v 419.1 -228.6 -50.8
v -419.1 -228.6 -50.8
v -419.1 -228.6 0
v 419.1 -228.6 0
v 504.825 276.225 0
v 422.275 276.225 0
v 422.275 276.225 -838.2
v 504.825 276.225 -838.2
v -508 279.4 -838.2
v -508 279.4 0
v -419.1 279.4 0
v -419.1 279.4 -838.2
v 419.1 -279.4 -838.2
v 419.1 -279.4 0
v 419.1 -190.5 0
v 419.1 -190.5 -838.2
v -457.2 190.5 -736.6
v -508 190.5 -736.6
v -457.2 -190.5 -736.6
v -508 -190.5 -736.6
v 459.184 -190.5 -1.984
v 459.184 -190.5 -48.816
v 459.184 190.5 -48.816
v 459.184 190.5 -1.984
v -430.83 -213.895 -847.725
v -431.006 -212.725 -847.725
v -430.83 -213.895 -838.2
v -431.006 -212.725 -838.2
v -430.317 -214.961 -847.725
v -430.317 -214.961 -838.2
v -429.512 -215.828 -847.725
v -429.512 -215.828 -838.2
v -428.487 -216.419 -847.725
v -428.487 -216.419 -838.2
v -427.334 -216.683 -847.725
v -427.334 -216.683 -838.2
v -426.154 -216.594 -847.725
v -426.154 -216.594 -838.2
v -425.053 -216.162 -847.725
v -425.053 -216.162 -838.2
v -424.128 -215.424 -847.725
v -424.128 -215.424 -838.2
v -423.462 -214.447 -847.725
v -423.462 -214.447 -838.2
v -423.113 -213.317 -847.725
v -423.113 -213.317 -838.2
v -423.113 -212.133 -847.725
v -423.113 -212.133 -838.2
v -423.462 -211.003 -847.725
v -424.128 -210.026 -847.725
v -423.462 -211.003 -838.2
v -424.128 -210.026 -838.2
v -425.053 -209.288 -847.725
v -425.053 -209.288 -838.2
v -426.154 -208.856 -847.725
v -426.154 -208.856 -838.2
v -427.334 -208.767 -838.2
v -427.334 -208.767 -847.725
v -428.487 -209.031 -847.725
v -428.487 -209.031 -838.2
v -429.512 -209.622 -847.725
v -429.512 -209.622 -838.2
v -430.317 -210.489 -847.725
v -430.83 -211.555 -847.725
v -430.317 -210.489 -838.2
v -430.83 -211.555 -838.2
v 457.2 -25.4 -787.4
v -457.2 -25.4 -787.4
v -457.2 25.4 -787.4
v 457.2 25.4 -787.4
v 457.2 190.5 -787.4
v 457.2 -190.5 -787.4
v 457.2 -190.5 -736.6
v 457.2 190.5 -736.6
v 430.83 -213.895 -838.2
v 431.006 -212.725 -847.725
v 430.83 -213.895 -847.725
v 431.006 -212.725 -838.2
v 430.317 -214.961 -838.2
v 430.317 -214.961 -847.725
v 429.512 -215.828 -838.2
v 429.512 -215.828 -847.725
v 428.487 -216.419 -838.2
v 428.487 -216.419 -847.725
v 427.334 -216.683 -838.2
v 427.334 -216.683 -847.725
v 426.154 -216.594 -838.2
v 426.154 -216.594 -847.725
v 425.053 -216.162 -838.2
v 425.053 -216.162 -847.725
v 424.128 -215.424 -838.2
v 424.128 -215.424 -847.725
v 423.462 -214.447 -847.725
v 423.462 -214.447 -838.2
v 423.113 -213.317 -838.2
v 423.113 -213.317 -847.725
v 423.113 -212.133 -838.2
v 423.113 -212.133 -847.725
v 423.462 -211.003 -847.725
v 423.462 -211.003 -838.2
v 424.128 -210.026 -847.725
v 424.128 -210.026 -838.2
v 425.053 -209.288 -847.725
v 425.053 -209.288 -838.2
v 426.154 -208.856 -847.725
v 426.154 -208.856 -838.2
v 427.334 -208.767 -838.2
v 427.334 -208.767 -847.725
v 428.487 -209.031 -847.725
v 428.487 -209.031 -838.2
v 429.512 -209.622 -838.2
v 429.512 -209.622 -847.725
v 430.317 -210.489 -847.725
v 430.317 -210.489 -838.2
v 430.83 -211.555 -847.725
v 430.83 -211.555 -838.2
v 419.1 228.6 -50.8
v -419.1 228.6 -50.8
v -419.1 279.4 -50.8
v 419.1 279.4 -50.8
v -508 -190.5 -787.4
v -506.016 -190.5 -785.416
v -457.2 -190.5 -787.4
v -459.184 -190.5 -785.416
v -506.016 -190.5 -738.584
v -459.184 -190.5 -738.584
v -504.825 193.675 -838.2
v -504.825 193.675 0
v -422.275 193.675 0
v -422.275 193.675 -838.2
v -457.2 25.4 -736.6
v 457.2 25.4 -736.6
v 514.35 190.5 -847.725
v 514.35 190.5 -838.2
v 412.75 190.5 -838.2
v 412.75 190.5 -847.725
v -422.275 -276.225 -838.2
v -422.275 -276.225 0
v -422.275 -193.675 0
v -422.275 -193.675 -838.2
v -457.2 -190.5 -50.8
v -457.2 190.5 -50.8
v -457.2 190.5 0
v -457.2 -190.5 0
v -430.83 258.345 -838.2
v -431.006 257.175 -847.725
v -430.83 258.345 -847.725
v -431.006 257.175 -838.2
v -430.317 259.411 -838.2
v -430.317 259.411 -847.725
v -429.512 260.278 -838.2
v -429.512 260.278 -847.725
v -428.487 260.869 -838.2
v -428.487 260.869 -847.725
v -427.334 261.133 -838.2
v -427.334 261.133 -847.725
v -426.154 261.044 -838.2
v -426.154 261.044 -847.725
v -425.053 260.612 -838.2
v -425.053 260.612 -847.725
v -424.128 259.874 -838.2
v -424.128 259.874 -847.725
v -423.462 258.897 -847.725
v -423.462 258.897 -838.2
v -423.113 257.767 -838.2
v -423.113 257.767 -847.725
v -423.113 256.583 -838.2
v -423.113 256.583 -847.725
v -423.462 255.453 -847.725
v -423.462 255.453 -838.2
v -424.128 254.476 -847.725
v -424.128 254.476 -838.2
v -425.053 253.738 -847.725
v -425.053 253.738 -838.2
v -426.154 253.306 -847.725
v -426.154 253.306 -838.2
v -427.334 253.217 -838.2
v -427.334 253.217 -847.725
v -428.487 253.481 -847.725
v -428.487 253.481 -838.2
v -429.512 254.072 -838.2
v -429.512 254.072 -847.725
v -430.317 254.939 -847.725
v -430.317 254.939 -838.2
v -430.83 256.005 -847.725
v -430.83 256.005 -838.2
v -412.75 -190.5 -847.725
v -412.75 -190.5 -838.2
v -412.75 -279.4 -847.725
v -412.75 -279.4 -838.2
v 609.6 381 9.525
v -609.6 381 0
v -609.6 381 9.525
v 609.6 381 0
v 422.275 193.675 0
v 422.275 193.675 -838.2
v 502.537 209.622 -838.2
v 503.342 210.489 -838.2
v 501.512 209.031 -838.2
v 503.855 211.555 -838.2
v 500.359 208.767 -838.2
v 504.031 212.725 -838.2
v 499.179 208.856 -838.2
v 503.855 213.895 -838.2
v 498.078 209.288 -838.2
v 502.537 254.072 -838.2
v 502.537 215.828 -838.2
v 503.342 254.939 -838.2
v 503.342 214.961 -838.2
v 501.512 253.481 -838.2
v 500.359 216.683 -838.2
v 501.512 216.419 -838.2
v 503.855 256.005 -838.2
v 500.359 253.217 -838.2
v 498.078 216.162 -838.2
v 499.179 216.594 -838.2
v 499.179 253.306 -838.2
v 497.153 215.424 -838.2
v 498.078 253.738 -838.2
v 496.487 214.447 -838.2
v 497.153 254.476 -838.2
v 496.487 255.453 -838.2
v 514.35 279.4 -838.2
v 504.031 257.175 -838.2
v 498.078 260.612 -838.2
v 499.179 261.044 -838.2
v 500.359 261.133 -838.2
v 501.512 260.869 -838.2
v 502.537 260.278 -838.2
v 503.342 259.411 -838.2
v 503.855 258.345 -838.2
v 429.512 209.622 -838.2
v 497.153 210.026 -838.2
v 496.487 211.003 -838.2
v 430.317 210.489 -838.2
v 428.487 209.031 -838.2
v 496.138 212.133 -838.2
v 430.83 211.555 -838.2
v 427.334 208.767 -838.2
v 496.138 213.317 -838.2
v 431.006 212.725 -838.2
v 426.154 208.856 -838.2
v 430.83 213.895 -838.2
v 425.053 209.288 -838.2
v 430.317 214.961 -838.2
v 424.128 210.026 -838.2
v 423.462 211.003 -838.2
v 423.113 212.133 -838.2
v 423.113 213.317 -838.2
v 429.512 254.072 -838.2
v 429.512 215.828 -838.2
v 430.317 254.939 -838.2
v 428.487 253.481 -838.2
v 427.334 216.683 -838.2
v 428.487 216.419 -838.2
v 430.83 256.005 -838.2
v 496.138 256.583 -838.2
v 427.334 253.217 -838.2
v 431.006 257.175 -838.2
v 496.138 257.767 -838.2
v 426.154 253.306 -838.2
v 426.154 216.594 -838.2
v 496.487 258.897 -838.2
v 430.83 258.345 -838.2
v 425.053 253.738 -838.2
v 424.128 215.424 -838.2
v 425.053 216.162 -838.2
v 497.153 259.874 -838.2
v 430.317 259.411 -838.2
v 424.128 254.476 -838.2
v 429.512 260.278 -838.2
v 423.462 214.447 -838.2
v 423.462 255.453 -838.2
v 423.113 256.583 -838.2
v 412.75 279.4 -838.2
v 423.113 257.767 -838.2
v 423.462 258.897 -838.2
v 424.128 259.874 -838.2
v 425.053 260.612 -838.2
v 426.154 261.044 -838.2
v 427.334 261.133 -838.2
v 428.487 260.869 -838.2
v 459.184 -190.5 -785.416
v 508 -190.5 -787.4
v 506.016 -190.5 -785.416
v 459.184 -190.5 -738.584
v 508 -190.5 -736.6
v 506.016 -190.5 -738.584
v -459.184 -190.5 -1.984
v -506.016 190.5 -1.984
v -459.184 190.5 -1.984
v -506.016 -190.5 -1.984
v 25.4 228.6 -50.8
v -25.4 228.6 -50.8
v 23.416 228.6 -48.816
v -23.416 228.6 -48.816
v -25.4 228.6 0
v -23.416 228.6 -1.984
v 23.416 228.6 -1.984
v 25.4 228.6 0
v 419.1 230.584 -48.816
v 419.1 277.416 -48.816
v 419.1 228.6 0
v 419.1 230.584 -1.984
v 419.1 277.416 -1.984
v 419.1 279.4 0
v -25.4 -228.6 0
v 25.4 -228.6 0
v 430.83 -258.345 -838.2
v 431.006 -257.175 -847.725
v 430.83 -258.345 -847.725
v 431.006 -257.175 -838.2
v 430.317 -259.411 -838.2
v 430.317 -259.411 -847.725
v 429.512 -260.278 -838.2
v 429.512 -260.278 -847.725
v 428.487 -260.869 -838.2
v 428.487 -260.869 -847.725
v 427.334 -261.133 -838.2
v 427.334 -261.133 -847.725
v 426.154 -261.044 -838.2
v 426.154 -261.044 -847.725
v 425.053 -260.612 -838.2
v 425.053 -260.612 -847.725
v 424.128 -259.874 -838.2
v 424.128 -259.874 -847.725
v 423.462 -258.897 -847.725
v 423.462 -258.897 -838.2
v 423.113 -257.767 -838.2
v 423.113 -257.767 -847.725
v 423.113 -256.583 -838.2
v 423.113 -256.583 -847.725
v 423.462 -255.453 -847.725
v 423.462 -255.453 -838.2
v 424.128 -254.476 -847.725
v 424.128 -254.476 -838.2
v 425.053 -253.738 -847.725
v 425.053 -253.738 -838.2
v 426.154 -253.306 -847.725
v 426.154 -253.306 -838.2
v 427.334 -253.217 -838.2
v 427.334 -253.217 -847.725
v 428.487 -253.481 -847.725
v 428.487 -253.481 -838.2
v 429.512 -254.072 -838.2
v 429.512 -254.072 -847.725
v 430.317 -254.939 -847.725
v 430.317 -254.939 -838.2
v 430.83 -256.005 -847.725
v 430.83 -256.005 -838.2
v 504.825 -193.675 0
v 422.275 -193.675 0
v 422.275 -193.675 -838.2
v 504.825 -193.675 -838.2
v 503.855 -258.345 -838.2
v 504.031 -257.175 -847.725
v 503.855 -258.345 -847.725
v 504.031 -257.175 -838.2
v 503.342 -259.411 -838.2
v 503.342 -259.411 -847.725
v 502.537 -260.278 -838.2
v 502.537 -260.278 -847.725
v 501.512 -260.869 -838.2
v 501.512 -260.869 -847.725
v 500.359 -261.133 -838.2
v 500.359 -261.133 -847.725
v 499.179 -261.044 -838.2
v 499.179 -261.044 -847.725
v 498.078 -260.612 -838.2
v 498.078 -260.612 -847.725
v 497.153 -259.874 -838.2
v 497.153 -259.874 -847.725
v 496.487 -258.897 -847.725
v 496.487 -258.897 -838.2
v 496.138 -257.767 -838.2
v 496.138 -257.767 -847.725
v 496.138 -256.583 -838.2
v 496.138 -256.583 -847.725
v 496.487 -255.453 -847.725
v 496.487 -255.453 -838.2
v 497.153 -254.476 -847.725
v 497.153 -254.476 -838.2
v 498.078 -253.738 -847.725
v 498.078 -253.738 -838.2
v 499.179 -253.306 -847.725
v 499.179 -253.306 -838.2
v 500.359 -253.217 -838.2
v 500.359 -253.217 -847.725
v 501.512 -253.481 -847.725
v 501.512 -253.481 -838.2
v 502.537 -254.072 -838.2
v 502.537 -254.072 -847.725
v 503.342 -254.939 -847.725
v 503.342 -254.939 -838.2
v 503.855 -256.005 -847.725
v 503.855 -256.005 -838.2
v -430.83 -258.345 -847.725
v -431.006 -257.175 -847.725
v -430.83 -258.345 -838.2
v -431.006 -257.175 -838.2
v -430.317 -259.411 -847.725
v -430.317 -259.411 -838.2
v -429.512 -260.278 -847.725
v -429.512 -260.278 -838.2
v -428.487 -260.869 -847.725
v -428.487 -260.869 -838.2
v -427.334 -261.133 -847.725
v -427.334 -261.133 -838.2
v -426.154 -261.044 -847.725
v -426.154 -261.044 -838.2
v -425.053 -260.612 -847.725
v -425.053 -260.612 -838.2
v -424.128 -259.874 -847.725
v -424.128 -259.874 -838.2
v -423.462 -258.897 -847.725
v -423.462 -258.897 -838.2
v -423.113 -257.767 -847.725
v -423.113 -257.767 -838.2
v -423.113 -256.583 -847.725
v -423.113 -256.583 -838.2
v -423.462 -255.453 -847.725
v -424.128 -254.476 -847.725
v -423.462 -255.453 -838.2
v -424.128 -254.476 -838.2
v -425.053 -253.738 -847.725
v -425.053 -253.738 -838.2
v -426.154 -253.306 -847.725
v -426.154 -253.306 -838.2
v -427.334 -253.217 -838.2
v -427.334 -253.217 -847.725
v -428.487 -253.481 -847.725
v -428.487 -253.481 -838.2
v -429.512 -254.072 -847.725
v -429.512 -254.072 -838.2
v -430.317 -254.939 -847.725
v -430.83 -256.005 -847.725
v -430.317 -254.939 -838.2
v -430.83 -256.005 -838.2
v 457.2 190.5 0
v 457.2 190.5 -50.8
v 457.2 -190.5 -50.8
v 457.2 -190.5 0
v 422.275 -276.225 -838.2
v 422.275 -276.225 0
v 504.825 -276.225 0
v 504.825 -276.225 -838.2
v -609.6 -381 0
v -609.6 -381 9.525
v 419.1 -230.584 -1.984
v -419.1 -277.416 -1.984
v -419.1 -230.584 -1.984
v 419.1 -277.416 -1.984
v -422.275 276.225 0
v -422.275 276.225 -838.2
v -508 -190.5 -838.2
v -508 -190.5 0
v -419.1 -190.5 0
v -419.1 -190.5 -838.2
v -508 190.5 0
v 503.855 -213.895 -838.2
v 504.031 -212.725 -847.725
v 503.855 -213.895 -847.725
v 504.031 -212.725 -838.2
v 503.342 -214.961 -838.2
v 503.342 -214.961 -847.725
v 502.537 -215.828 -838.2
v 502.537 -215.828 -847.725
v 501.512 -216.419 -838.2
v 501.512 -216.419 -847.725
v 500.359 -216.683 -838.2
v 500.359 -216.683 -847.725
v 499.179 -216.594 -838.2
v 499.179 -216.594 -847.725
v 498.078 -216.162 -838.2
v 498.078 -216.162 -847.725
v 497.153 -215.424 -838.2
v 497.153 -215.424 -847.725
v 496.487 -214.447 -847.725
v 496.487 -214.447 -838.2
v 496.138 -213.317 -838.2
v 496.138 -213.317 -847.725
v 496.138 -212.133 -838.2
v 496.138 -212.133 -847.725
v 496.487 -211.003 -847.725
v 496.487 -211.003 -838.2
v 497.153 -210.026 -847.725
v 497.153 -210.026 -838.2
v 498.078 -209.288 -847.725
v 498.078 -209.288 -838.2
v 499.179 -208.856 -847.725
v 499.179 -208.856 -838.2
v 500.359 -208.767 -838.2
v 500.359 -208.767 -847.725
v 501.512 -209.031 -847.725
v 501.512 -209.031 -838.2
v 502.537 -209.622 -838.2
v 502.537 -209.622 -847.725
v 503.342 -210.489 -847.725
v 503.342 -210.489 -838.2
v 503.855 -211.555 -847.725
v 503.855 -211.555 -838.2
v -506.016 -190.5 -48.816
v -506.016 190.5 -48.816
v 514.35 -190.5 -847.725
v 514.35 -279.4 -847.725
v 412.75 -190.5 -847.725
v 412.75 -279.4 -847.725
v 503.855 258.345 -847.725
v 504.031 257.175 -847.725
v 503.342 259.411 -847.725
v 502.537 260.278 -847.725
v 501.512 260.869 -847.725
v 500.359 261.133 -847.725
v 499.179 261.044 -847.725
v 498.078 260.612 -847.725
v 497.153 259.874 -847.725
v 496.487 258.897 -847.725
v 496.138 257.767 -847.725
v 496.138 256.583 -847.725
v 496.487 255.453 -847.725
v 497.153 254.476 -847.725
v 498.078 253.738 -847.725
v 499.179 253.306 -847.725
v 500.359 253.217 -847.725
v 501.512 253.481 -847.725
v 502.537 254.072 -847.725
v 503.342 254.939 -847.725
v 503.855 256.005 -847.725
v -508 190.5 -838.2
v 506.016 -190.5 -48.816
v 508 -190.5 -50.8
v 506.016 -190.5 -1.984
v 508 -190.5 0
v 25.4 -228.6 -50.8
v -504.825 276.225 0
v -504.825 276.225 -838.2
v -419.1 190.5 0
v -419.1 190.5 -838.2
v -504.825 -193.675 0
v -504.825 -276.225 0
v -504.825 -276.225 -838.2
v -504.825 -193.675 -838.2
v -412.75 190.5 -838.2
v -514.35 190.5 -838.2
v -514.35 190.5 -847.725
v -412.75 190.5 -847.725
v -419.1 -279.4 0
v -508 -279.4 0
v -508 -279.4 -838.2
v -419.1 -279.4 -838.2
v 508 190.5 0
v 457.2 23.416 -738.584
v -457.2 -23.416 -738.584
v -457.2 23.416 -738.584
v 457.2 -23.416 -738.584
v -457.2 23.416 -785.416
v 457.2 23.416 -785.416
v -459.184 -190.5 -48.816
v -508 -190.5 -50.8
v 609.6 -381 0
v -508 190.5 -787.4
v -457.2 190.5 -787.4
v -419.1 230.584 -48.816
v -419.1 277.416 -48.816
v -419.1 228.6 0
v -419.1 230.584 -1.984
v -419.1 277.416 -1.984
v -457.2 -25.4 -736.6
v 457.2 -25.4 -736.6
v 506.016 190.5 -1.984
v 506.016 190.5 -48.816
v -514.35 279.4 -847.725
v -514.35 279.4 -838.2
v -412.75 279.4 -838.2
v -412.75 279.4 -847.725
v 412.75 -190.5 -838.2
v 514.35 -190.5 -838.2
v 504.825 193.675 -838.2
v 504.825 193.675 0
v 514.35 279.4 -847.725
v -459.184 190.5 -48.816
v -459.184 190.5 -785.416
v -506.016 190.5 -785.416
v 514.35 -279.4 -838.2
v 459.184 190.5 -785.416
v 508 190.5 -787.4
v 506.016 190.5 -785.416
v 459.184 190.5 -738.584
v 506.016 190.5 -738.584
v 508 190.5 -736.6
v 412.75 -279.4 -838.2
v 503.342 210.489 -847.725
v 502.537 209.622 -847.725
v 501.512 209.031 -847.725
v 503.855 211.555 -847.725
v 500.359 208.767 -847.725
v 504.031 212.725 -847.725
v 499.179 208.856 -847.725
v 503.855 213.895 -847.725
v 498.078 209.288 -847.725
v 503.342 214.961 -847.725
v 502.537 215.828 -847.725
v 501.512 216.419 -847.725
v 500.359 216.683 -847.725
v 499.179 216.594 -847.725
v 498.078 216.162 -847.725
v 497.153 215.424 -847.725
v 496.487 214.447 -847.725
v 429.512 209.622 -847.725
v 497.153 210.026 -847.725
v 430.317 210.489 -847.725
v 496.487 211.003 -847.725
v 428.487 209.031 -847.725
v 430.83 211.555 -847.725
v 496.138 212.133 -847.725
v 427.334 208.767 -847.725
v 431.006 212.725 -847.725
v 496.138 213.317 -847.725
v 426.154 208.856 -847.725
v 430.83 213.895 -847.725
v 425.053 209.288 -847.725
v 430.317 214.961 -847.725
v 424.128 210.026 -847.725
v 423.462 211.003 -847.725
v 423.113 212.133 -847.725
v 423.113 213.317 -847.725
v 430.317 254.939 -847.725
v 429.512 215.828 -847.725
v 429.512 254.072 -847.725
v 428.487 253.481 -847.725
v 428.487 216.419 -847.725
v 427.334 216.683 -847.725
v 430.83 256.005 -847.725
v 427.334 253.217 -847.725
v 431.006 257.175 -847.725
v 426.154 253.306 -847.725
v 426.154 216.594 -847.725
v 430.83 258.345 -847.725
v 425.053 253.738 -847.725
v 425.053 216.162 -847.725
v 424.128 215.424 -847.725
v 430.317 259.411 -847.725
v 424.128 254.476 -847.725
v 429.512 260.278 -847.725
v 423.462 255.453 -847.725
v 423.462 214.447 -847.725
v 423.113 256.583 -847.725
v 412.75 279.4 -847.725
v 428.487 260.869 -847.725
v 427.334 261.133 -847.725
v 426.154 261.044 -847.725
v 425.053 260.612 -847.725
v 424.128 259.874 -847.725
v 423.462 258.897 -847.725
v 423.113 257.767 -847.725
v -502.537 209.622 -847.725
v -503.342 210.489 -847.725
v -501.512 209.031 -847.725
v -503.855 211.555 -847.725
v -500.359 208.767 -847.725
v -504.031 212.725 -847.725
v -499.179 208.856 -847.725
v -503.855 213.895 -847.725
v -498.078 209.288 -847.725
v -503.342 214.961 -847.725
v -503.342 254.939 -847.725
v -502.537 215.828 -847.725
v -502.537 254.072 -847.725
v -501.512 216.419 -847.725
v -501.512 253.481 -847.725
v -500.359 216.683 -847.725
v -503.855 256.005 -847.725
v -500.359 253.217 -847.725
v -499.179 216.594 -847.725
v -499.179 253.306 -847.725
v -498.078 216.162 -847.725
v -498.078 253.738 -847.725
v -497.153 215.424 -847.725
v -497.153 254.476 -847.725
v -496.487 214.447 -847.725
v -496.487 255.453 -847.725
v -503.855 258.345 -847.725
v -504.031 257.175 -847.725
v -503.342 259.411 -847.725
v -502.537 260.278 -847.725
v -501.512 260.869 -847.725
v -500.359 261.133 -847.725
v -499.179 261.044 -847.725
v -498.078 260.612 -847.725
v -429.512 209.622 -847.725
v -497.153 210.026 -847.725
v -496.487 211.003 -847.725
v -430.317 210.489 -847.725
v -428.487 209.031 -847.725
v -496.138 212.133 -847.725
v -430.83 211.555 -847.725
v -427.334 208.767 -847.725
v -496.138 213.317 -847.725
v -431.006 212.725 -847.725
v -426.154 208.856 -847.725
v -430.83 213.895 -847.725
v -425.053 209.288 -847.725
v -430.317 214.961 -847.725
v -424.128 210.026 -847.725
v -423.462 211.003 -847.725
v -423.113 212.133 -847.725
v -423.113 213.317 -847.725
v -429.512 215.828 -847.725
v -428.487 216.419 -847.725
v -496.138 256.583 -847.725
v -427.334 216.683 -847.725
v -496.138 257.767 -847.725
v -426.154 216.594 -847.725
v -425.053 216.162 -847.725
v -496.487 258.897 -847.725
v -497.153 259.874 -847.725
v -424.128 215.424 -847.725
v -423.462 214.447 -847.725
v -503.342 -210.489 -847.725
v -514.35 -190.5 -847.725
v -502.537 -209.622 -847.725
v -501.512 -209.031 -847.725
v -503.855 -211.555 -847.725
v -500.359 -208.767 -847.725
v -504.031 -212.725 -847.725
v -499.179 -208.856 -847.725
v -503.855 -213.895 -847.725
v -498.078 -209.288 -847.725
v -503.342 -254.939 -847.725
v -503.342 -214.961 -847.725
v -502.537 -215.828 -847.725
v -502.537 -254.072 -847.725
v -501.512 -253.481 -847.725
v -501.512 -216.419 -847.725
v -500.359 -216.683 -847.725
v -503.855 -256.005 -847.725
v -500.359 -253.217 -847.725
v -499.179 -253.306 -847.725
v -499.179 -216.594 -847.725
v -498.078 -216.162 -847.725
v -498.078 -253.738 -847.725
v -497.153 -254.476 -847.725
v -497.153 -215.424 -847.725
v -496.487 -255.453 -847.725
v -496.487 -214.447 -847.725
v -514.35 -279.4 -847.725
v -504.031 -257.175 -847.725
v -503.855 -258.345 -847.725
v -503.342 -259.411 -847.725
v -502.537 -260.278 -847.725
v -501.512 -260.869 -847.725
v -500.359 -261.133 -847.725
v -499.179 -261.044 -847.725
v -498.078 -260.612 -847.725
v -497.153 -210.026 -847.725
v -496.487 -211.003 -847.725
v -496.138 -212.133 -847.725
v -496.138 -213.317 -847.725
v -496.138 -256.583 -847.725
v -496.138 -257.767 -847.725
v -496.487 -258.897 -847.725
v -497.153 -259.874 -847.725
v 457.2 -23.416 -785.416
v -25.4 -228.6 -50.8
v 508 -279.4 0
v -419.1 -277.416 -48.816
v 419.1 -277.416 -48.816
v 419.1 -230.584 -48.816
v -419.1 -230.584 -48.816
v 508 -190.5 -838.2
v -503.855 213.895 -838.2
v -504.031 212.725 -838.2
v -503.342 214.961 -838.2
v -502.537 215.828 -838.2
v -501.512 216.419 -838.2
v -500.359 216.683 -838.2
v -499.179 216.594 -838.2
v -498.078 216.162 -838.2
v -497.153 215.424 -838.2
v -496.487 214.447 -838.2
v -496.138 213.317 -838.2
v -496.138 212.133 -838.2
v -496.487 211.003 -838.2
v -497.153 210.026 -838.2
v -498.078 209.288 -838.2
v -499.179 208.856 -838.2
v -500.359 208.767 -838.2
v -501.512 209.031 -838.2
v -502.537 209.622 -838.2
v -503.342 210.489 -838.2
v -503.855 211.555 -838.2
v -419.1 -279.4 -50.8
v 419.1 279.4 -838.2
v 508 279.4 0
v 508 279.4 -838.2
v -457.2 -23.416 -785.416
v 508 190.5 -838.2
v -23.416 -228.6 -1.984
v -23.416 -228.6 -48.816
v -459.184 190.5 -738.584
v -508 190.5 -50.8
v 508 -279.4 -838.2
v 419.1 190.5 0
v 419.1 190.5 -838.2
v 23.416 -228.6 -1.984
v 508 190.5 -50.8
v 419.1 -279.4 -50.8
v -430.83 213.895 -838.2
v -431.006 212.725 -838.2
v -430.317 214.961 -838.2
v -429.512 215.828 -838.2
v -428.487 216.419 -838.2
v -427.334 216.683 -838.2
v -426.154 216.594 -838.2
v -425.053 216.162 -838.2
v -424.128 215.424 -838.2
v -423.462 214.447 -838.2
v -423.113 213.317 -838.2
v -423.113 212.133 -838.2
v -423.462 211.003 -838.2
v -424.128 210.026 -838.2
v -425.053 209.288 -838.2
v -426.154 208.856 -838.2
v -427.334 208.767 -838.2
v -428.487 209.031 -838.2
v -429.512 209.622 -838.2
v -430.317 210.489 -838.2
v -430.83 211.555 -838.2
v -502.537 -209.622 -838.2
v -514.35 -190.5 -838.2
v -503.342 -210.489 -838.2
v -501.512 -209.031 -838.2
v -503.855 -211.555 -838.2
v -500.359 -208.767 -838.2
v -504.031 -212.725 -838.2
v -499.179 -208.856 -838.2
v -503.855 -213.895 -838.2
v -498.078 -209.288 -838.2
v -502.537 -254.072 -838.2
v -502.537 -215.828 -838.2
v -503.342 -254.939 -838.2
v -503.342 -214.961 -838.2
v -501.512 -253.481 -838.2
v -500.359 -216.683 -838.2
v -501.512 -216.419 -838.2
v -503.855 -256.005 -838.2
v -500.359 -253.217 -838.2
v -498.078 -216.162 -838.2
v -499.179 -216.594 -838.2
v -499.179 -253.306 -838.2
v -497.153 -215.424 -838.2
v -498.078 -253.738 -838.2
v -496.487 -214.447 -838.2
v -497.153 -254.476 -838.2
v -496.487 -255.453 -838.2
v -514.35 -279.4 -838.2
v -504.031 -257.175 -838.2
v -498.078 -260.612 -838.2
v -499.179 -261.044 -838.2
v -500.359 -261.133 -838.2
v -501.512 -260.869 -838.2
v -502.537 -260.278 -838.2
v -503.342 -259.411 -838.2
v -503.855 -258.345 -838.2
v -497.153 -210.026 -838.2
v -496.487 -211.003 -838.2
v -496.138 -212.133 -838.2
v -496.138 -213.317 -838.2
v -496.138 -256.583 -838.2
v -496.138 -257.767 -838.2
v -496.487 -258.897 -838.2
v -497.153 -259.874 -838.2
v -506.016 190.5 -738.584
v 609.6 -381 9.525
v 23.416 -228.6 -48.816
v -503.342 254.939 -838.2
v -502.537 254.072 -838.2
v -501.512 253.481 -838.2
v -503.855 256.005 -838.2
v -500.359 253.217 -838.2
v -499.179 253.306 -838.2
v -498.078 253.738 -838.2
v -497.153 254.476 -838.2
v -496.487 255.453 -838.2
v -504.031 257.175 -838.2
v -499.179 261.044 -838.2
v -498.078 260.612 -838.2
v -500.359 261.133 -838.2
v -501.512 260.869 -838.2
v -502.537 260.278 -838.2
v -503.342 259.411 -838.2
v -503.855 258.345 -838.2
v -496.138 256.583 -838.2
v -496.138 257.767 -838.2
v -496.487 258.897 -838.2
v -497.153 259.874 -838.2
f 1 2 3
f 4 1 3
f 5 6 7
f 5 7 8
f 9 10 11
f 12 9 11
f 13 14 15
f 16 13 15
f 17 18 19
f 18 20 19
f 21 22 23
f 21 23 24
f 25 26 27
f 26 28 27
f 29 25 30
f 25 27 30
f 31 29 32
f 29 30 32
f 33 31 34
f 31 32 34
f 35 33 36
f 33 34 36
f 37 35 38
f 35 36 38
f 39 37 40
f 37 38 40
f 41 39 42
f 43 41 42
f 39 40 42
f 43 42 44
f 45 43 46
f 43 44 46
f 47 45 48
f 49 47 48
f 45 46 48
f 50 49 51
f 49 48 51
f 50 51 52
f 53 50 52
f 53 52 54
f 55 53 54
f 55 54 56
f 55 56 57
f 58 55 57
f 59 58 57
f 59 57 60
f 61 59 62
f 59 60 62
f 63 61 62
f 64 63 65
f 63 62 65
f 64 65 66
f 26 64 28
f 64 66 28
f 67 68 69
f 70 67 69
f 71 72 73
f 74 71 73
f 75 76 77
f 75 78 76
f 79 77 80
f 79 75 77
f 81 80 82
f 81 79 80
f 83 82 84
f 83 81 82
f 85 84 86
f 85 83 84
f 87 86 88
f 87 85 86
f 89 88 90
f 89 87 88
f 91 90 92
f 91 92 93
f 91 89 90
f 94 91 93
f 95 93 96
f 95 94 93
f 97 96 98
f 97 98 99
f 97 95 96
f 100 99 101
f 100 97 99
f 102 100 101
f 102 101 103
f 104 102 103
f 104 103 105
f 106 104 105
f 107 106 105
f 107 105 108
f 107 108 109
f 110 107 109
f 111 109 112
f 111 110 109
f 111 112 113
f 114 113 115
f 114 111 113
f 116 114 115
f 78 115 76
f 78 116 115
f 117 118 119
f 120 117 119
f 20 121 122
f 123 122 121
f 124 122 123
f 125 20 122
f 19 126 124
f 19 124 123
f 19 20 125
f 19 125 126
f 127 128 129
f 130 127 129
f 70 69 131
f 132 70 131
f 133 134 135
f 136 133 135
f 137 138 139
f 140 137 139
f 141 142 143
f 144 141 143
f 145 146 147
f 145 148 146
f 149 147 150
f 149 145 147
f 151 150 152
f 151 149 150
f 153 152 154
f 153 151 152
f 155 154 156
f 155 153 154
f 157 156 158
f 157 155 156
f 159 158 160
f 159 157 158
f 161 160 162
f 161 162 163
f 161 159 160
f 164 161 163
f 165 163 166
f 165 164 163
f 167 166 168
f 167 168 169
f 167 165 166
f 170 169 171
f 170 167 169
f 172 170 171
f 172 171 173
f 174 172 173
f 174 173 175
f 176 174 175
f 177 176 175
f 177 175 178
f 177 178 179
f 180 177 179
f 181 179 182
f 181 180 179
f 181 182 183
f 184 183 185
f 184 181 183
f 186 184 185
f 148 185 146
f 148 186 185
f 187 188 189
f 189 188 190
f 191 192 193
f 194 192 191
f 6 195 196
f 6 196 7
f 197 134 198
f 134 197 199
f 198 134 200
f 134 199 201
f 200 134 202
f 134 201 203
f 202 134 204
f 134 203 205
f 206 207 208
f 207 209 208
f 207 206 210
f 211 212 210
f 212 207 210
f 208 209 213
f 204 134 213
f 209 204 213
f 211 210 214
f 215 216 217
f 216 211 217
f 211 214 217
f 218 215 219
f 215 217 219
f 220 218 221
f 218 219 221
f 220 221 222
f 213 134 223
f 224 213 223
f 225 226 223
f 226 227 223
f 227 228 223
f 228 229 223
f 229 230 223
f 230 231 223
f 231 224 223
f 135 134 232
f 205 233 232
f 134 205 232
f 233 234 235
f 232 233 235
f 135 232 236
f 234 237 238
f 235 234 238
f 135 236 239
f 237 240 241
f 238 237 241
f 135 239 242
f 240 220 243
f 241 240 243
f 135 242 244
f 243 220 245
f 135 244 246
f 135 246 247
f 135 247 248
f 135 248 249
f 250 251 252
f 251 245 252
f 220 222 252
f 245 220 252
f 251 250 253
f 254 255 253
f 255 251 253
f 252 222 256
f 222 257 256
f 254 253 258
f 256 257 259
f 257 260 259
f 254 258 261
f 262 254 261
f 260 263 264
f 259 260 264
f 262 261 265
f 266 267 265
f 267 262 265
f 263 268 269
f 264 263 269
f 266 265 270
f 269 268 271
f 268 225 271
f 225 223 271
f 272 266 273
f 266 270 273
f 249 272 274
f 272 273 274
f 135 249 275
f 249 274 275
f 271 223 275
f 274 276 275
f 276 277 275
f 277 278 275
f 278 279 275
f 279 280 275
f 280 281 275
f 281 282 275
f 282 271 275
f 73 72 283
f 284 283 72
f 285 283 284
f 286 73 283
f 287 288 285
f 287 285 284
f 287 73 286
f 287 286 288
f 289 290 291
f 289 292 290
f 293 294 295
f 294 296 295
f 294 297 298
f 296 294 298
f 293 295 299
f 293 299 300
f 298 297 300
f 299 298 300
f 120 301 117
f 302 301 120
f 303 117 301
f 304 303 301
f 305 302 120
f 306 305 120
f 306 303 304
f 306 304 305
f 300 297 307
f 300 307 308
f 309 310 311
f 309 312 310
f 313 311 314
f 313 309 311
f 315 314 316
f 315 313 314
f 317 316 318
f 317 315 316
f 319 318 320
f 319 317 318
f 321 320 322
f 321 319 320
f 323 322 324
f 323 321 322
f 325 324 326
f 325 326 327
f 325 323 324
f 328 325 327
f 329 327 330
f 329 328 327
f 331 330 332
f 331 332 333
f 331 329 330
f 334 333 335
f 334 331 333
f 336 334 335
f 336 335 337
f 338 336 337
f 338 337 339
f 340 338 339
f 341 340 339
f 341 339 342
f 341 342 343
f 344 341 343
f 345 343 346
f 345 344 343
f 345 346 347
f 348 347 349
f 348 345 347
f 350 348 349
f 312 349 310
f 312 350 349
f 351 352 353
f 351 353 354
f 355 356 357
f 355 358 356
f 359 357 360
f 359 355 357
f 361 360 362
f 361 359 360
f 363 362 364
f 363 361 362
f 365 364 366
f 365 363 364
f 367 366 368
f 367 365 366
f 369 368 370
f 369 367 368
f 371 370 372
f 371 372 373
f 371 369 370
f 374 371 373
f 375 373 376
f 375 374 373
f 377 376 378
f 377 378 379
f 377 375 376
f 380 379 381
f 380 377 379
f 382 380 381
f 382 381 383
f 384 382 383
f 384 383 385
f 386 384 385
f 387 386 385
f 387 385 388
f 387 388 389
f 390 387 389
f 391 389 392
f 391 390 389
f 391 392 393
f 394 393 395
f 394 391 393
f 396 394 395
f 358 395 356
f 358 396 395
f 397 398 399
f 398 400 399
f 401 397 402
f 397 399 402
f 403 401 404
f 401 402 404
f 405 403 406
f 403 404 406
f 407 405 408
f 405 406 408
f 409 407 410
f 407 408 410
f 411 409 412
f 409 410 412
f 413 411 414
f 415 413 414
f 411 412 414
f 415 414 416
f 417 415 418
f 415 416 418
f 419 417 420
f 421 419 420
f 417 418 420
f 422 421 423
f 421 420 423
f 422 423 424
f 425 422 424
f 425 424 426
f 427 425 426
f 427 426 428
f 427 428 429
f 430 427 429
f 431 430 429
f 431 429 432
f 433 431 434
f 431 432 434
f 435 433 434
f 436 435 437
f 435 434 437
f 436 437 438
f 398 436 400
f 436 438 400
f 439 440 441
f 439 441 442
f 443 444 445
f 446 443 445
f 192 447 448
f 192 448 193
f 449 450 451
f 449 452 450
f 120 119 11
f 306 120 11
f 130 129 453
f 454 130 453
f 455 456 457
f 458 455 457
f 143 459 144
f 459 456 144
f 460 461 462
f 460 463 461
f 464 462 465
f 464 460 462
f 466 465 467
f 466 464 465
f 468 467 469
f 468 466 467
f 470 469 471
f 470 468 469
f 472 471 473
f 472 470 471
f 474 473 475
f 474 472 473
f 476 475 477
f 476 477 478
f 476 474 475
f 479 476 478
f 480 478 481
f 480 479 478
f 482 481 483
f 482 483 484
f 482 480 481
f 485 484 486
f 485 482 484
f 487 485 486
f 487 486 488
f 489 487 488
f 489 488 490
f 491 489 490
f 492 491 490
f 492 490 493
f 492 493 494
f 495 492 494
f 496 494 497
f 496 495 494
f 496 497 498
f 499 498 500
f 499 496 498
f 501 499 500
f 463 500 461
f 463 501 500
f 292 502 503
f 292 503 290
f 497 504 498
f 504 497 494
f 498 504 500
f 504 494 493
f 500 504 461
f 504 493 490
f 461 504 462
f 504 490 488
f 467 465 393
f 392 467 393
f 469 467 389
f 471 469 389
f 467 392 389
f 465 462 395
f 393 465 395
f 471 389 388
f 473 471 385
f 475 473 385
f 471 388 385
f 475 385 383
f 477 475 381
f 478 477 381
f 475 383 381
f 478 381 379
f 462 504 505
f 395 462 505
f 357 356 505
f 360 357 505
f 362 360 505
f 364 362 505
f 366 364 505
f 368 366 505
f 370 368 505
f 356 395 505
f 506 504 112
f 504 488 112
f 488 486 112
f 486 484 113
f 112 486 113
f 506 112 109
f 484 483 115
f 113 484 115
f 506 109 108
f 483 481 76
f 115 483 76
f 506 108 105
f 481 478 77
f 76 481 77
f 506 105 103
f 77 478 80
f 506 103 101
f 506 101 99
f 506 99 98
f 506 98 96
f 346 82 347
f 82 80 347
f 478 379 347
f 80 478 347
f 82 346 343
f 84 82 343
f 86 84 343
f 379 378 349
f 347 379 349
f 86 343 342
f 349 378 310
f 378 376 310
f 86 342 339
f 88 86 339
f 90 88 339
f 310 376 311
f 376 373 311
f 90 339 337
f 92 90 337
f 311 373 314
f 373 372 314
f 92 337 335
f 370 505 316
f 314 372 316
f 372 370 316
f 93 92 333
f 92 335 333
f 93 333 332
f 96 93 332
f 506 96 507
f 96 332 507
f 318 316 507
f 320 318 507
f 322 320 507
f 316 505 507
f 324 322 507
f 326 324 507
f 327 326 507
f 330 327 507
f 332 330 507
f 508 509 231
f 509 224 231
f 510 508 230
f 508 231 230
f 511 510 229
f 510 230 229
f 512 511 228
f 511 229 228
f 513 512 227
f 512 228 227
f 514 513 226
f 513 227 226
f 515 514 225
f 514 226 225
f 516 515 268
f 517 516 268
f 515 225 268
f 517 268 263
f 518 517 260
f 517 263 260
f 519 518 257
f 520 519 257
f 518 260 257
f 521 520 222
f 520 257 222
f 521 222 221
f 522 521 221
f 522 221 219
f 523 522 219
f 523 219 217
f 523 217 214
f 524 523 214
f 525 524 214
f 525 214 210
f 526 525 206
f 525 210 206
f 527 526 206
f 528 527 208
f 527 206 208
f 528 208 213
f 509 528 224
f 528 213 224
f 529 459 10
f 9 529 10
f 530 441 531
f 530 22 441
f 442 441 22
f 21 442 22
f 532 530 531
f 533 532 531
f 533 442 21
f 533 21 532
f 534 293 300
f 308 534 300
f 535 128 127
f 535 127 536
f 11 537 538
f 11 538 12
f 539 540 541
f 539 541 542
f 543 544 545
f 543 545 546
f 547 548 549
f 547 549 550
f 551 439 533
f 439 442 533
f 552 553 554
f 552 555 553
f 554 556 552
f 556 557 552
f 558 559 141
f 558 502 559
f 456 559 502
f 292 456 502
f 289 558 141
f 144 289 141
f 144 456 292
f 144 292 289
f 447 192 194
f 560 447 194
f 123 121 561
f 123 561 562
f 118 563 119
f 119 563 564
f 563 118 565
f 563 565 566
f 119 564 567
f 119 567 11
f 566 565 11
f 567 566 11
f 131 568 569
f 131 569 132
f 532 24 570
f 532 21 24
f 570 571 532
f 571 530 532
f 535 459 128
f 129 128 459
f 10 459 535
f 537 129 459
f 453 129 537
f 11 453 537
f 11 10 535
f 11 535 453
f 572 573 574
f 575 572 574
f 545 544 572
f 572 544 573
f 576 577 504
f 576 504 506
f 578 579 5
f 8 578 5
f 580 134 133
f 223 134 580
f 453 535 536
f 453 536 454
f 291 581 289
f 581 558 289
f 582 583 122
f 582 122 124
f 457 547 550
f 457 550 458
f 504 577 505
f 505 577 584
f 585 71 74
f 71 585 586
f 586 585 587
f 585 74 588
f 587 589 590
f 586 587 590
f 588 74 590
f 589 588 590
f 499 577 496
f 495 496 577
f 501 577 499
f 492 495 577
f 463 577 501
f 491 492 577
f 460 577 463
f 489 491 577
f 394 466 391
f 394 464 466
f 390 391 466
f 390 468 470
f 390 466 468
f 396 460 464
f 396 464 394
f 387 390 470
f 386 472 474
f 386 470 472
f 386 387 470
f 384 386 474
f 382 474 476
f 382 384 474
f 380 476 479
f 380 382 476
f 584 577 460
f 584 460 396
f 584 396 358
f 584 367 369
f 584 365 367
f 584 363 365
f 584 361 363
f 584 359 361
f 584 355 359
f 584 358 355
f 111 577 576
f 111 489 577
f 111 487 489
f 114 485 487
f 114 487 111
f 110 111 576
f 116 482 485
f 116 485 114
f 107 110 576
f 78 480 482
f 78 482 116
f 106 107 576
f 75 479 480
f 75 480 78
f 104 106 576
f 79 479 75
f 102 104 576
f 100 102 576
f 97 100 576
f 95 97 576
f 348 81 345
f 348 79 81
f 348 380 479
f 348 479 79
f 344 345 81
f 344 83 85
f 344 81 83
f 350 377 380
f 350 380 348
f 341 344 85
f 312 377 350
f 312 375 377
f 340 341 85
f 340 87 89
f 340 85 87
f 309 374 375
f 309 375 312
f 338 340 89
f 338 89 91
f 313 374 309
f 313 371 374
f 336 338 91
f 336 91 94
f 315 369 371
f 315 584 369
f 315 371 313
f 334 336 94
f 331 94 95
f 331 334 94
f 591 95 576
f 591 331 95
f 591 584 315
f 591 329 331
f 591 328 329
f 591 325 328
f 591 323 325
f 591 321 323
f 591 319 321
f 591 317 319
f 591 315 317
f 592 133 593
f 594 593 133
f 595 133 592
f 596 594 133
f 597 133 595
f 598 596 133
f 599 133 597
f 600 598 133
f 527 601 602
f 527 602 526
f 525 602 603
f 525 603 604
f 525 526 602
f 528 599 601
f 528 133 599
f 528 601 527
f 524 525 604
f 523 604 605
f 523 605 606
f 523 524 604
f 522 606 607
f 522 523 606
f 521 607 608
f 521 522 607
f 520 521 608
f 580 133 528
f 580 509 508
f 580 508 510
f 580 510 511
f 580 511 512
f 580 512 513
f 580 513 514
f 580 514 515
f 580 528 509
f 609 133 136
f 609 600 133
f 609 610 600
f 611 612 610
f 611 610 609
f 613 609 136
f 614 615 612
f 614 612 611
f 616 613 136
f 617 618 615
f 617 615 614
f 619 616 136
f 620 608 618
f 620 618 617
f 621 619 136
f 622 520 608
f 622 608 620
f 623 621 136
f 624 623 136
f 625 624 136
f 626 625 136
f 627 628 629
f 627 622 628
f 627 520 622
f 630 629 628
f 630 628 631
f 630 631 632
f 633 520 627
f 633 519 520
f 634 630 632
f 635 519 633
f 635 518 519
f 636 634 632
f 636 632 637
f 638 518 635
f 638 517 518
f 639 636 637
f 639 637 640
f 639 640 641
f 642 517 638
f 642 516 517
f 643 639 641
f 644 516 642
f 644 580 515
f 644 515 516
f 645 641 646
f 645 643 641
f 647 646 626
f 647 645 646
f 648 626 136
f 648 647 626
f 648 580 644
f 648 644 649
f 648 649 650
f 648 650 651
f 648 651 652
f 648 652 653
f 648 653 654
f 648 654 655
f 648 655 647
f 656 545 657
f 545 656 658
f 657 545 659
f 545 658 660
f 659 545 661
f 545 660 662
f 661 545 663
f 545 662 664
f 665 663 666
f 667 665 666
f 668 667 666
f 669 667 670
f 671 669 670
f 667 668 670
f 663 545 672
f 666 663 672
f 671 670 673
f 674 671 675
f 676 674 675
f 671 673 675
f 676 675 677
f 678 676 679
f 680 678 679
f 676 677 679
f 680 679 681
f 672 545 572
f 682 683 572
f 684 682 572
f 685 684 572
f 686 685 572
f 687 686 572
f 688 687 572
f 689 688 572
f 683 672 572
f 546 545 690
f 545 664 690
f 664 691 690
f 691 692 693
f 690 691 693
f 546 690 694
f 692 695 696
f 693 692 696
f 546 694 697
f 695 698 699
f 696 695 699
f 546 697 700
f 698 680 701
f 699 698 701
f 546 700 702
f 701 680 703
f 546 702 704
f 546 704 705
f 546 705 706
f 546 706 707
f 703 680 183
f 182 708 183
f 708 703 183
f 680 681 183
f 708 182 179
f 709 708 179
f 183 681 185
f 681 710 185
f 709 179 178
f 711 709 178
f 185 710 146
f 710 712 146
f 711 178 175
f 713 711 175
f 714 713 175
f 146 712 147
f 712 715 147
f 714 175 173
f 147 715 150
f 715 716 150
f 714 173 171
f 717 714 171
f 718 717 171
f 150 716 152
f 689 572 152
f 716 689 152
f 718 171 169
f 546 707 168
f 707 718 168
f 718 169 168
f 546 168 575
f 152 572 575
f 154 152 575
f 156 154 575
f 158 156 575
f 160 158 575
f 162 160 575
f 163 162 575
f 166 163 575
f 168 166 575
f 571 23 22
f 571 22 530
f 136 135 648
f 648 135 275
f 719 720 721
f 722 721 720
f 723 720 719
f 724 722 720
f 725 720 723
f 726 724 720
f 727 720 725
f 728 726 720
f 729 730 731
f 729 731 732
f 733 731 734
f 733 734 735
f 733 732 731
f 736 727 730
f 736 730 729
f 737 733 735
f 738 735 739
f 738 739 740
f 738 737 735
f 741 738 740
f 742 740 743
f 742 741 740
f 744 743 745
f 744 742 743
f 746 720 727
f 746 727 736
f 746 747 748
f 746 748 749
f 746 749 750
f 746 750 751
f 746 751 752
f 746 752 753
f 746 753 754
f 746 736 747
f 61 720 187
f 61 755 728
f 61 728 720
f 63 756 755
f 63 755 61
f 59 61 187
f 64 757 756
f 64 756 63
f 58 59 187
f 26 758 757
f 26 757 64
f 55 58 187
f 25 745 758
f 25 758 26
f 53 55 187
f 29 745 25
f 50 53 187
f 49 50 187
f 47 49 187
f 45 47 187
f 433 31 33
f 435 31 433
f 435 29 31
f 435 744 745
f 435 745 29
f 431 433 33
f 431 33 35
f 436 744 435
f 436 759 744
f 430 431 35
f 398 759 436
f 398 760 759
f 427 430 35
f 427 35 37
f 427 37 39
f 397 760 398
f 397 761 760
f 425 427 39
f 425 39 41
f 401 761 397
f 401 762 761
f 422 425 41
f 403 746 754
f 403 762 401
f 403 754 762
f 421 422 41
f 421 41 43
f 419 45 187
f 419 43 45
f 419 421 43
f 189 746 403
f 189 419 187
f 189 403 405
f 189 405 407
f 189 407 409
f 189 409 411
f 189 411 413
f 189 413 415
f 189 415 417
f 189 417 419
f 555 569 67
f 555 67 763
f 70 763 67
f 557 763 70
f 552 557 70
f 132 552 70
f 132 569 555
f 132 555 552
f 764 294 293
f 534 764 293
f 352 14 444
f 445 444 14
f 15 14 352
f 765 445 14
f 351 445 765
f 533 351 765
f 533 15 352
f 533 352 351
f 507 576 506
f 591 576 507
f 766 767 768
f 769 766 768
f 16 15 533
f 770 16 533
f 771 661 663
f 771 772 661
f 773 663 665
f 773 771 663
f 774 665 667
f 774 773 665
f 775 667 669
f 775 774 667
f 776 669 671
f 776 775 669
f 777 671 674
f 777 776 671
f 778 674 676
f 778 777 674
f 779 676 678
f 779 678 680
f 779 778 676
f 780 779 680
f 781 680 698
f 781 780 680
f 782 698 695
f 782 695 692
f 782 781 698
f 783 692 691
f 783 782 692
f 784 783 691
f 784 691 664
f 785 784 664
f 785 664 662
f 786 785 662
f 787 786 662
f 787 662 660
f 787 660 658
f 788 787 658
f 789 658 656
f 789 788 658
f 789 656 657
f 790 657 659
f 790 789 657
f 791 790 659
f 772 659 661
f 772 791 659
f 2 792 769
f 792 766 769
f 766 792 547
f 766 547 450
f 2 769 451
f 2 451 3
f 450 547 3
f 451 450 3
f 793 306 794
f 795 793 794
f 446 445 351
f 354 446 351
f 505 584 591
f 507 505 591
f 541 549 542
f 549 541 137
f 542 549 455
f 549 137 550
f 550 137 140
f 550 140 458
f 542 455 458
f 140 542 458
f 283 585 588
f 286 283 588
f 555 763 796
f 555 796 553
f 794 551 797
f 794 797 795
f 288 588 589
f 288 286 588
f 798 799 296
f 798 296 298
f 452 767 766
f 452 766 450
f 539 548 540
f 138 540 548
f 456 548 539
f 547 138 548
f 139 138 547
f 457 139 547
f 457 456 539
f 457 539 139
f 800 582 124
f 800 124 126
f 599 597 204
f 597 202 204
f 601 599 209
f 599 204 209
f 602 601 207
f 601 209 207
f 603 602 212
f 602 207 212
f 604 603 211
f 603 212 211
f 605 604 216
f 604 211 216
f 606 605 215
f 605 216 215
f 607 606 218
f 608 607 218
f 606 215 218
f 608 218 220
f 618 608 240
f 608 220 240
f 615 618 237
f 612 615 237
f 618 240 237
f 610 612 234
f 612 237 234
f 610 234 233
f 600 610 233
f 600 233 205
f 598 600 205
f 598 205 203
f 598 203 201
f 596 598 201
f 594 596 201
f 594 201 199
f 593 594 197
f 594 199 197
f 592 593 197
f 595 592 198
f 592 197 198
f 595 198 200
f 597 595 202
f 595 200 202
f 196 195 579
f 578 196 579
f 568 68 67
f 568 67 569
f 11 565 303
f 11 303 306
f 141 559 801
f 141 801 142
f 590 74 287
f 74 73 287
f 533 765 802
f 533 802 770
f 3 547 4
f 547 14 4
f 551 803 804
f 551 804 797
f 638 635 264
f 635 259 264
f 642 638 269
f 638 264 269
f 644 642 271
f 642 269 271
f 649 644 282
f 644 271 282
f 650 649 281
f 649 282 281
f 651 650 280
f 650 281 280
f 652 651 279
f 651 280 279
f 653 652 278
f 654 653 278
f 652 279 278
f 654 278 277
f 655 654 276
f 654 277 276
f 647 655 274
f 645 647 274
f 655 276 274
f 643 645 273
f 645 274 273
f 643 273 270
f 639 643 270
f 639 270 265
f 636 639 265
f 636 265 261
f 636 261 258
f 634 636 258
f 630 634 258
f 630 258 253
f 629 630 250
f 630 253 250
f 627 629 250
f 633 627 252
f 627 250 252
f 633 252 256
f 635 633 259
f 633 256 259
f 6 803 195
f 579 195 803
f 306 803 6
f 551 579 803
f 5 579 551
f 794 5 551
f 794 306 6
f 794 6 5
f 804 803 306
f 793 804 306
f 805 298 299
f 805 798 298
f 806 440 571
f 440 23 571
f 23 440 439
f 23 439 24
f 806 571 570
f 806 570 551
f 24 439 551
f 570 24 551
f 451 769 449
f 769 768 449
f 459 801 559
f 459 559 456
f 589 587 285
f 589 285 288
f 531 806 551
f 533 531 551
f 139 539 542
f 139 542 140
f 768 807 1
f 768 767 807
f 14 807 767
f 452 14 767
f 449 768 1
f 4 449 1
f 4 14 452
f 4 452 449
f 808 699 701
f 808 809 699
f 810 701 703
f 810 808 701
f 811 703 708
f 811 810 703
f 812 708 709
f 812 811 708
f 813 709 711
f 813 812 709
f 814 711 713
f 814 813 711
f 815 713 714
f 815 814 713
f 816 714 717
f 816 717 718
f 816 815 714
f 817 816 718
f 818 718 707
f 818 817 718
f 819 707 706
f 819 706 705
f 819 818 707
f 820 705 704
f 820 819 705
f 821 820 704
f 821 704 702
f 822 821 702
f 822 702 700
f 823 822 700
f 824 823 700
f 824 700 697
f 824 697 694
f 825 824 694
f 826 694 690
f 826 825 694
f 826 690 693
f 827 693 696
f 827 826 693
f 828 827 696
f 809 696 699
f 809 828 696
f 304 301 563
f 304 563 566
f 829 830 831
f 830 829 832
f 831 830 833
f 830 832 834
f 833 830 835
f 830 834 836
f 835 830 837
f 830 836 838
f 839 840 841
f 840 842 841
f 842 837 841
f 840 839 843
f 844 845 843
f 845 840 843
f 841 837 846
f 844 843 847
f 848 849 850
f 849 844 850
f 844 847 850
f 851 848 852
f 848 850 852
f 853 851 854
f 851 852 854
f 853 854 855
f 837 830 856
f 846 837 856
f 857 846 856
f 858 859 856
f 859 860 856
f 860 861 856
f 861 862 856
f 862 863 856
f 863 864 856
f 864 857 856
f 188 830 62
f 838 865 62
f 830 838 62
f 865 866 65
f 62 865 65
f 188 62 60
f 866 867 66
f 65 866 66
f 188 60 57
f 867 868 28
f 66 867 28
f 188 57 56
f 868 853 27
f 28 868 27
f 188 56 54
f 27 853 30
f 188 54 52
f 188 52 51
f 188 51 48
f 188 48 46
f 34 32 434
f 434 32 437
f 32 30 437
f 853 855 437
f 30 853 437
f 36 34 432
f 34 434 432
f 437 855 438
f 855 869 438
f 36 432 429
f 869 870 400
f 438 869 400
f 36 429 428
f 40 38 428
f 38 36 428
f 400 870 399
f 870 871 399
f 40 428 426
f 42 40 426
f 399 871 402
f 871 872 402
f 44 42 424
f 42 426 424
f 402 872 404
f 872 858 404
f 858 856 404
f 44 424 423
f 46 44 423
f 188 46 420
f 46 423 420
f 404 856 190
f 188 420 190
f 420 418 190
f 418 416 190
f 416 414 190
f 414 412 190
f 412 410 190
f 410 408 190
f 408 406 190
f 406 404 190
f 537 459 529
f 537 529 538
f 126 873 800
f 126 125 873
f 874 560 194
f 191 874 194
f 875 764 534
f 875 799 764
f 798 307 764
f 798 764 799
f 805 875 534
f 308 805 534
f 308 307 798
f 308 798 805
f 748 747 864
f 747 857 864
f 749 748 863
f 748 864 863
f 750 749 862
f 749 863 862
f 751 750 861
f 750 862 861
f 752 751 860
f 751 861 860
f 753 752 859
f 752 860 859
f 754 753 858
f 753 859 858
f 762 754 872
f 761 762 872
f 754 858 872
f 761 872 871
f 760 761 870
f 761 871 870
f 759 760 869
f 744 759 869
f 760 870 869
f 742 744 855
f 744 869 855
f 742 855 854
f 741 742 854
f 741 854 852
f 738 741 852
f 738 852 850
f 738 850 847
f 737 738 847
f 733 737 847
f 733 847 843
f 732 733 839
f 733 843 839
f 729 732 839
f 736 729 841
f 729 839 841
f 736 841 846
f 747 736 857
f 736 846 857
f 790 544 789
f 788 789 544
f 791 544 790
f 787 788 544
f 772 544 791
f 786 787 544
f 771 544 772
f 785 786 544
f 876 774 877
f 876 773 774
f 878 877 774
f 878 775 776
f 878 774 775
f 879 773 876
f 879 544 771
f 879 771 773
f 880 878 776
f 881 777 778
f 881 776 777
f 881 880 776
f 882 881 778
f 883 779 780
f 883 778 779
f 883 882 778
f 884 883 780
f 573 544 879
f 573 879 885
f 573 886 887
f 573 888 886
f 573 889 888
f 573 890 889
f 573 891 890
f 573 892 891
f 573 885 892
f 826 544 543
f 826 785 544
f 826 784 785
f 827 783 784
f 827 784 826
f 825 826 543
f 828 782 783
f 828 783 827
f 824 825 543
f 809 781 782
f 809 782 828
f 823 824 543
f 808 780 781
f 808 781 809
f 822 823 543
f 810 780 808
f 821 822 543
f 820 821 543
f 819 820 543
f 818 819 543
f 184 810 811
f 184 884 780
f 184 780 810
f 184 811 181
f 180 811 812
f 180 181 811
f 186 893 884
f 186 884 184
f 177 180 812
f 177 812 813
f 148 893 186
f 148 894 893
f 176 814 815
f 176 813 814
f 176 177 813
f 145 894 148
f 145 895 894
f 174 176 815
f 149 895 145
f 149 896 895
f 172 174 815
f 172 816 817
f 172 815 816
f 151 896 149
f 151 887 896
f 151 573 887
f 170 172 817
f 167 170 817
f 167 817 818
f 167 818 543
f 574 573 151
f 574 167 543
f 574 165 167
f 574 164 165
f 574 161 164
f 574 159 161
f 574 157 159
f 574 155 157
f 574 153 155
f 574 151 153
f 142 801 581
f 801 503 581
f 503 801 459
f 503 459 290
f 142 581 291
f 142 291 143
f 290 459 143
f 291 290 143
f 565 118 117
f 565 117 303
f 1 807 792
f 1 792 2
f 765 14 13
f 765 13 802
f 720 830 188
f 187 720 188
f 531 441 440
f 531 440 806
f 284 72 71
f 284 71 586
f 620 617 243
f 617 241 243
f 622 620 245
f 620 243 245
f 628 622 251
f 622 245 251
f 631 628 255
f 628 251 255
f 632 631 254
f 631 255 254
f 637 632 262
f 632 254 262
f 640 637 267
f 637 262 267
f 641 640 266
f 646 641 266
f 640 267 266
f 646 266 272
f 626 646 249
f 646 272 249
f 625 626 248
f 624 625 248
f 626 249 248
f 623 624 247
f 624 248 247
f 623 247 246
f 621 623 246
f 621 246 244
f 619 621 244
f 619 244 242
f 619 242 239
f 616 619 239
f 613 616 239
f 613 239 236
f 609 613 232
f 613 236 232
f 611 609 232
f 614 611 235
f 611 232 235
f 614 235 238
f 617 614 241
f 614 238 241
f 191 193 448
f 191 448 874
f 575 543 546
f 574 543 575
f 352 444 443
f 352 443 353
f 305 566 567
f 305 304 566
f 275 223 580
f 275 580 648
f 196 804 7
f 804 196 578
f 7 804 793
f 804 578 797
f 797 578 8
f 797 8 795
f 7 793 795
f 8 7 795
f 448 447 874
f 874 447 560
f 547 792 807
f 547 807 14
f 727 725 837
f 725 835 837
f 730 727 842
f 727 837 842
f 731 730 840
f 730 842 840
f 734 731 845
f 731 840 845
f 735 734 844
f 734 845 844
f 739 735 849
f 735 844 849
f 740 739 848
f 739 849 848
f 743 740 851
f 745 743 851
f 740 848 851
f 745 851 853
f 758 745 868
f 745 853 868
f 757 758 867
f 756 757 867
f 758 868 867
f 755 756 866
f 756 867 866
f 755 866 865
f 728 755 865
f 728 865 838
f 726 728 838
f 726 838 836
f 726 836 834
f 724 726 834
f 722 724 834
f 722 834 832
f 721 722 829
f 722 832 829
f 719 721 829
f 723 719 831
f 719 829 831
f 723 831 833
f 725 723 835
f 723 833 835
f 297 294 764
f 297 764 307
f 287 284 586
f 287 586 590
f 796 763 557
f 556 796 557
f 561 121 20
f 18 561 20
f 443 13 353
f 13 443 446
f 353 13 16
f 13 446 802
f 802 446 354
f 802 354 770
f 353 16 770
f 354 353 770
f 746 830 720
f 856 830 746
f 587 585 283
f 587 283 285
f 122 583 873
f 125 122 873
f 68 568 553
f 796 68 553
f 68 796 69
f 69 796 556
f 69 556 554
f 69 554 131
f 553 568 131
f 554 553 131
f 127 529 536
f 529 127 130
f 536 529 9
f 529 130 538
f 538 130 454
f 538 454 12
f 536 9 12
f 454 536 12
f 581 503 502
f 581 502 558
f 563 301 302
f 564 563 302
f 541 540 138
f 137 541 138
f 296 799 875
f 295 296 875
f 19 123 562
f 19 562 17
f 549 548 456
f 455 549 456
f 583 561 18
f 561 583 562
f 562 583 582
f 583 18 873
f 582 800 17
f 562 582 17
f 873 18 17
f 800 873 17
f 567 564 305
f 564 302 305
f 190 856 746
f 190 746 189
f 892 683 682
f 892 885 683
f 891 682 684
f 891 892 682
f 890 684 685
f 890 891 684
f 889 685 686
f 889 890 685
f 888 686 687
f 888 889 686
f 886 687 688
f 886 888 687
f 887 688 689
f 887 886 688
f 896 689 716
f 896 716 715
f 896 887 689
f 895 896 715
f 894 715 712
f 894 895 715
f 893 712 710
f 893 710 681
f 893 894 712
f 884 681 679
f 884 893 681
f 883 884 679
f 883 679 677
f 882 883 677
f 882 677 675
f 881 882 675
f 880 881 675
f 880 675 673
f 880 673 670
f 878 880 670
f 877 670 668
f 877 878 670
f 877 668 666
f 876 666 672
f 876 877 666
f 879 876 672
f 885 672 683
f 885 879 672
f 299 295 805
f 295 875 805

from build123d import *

# Parameters (mm, degrees)
F0_W           = 88.9
F0_H           = 88.9
F0_W_2         = 82.55
F0_H_2         = 82.55
F1_DEPTH       = 838.2
F2_W           = 50.8
F2_H           = 50.8
F2_W_2         = 46.83125
F2_H_2         = 46.83125
F3_DEPTH       = 419.1
F3_DEPTH_BACK  = 419.1
F4_W           = 50.8
F4_H           = 50.8
F4_W_2         = 46.83125
F4_H_2         = 46.83125
F5_DEPTH       = 190.5
F5_DEPTH_BACK  = 190.5
F6_W           = 50.8
F6_H           = 50.8
F6_W_2         = 46.83125
F6_H_2         = 46.83125
F7_DEPTH       = 457.2
F7_DEPTH_BACK  = 457.2
F8_W           = 1219.2
F8_H           = 762
F9_DEPTH       = 9.525
F11_W          = 101.6
F11_H          = 88.9
F12_DEPTH      = 9.525
F15_D          = 7.9375
F15_DEPTH      = 9.525
F15_TIP        = 2.3846655818
F18_W          = 50.8
F18_H          = 50.8
F18_W_2        = 46.83125
F18_H_2        = 46.83125
F19_DEPTH      = 228.6
F19_DEPTH_BACK = 228.6


# Not quite as in the source:
# - a length typed as a fraction of an inch, garbled in the dataset ("3 / 203.2 mm" for 3/8 in), is restored


with BuildPart() as f1:
    # F0 (on Top) → F1 (new body)
    with BuildSketch(Plane.XY):
        with Locations((463.55, -234.95)):
            Rectangle(F0_W, F0_H)
        with Locations((463.55, -234.95)):
            Rectangle(F0_W_2, F0_H_2, mode=Mode.SUBTRACT)
    extrude(amount=-F1_DEPTH)


with BuildPart() as f1b:
    # F0 (on Top) → F1, piece 2 (new body)
    with BuildSketch(Plane.XY):
        with Locations((463.55, 234.95)):
            Rectangle(F0_W, F0_H)
        with Locations((463.55, 234.95)):
            Rectangle(F0_W_2, F0_H_2, mode=Mode.SUBTRACT)
    extrude(amount=-F1_DEPTH)


with BuildPart() as f1c:
    # F0 (on Top) → F1, piece 3 (new body)
    with BuildSketch(Plane.XY):
        with Locations((-463.55, -234.95)):
            Rectangle(F0_W, F0_H)
        with Locations((-463.55, -234.95)):
            Rectangle(F0_W_2, F0_H_2, mode=Mode.SUBTRACT)
    extrude(amount=-F1_DEPTH)


with BuildPart() as f1d:
    # F0 (on Top) → F1, piece 4 (new body)
    with BuildSketch(Plane.XY):
        with Locations((-463.55, 234.95)):
            Rectangle(F0_W, F0_H)
        with Locations((-463.55, 234.95)):
            Rectangle(F0_W_2, F0_H_2, mode=Mode.SUBTRACT)
    extrude(amount=-F1_DEPTH)


with BuildPart() as f3:
    # F2 (on Right) → F3 (new body, two sides)
    with BuildSketch(Plane.YZ) as f3_sk:
        with Locations((-254, -25.4)):
            Rectangle(F2_W, F2_H)
        with Locations((-254, -25.4)):
            Rectangle(F2_W_2, F2_H_2, mode=Mode.SUBTRACT)
    extrude(amount=F3_DEPTH)
    extrude(f3_sk.sketch, amount=-F3_DEPTH_BACK)


with BuildPart() as f3b:
    # F2 (on Right) → F3, piece 2 (new body, two sides)
    with BuildSketch(Plane.YZ) as f3_2_sk:
        with Locations((254, -25.4)):
            Rectangle(F2_W, F2_H)
        with Locations((254, -25.4)):
            Rectangle(F2_W_2, F2_H_2, mode=Mode.SUBTRACT)
    extrude(amount=F3_DEPTH)
    extrude(f3_2_sk.sketch, amount=-F3_DEPTH_BACK)


with BuildPart() as f5:
    # F4 (on Front) → F5 (new body, two sides)
    with BuildSketch(Plane.XZ) as f5_sk:
        with Locations((-482.6, -25.4)):
            Rectangle(F4_W, F4_H)
        with Locations((-482.6, -25.4)):
            Rectangle(F4_W_2, F4_H_2, mode=Mode.SUBTRACT)
    extrude(amount=F5_DEPTH)
    extrude(f5_sk.sketch, amount=-F5_DEPTH_BACK)


with BuildPart() as f5b:
    # F4 (on Front) → F5, piece 2 (new body, two sides)
    with BuildSketch(Plane.XZ) as f5_2_sk:
        with Locations((482.6, -25.4)):
            Rectangle(F4_W, F4_H)
        with Locations((482.6, -25.4)):
            Rectangle(F4_W_2, F4_H_2, mode=Mode.SUBTRACT)
    extrude(amount=F5_DEPTH)
    extrude(f5_2_sk.sketch, amount=-F5_DEPTH_BACK)


with BuildPart() as f5c:
    # F4 (on Front) → F5, piece 3 (new body, two sides)
    with BuildSketch(Plane.XZ) as f5_3_sk:
        with Locations((-482.6, -762)):
            Rectangle(F4_W, F4_H)
        with Locations((-482.6, -762)):
            Rectangle(F4_W_2, F4_H_2, mode=Mode.SUBTRACT)
    extrude(amount=F5_DEPTH)
    extrude(f5_3_sk.sketch, amount=-F5_DEPTH_BACK)


with BuildPart() as f5d:
    # F4 (on Front) → F5, piece 4 (new body, two sides)
    with BuildSketch(Plane.XZ) as f5_4_sk:
        with Locations((482.6, -762)):
            Rectangle(F4_W, F4_H)
        with Locations((482.6, -762)):
            Rectangle(F4_W_2, F4_H_2, mode=Mode.SUBTRACT)
    extrude(amount=F5_DEPTH)
    extrude(f5_4_sk.sketch, amount=-F5_DEPTH_BACK)


with BuildPart() as f7:
    # F6 (on Right) → F7 (new body, two sides)
    with BuildSketch(Plane.YZ) as f7_sk:
        with Locations((0, -762)):
            Rectangle(F6_W, F6_H)
        with Locations((0, -762)):
            Rectangle(F6_W_2, F6_H_2, mode=Mode.SUBTRACT)
    extrude(amount=F7_DEPTH)
    extrude(f7_sk.sketch, amount=-F7_DEPTH_BACK)


with BuildPart() as f9:
    # F8 (on Top) → F9 (new body)
    with BuildSketch(Plane.XY):
        Rectangle(F8_W, F8_H)
    extrude(amount=F9_DEPTH)


with BuildPart() as f12:
    # F11 (on offset) → F12 (new body)
    with BuildSketch(Plane(origin=(0, 0, -838.2), x_dir=(1, 0, 0), z_dir=(0, 0, -1))):
        with Locations((-463.55, 234.95)):
            Rectangle(F11_W, F11_H)
    extrude(amount=F12_DEPTH)

    # F15
    with Locations(Plane(origin=(0, 0, -847.725), x_dir=(1, 0, 0), z_dir=(0, 0, -1))):
        with Locations((-500.0625, 257.175), (-500.0625, 212.725), (-427.0375, 212.725), (-427.0375, 257.175)):
            Hole(F15_D / 2, depth=F15_DEPTH)
            with Locations((0, 0, -(F15_DEPTH + F15_TIP / 2))):  # 118° drill point
                Cone(0, F15_D / 2, F15_TIP, mode=Mode.SUBTRACT)


with BuildPart() as f16_1:
    # F16: instance of F12
    add(f12.part.mirror(Plane.XZ))


with BuildPart() as f17_1:
    # F17: instance of F12
    add(f12.part.mirror(Plane.YZ))


with BuildPart() as f17_2:
    # F17: instance of F16_1
    add(f16_1.part.mirror(Plane.YZ))


with BuildPart() as f19:
    # F18 (on Front) → F19 (new body, two sides)
    with BuildSketch(Plane.XZ) as f19_sk:
        with Locations((0, -25.4)):
            Rectangle(F18_W, F18_H)
        with Locations((0, -25.4)):
            Rectangle(F18_W_2, F18_H_2, mode=Mode.SUBTRACT)
    extrude(amount=F19_DEPTH)
    extrude(f19_sk.sketch, amount=-F19_DEPTH_BACK)


solid = Compound([f1.part, f1b.part, f1c.part, f1d.part, f3.part, f3b.part, f5.part, f5b.part, f5c.part, f5d.part, f7.part, f9.part, f12.part, f16_1.part, f17_1.part, f17_2.part, f19.part])
